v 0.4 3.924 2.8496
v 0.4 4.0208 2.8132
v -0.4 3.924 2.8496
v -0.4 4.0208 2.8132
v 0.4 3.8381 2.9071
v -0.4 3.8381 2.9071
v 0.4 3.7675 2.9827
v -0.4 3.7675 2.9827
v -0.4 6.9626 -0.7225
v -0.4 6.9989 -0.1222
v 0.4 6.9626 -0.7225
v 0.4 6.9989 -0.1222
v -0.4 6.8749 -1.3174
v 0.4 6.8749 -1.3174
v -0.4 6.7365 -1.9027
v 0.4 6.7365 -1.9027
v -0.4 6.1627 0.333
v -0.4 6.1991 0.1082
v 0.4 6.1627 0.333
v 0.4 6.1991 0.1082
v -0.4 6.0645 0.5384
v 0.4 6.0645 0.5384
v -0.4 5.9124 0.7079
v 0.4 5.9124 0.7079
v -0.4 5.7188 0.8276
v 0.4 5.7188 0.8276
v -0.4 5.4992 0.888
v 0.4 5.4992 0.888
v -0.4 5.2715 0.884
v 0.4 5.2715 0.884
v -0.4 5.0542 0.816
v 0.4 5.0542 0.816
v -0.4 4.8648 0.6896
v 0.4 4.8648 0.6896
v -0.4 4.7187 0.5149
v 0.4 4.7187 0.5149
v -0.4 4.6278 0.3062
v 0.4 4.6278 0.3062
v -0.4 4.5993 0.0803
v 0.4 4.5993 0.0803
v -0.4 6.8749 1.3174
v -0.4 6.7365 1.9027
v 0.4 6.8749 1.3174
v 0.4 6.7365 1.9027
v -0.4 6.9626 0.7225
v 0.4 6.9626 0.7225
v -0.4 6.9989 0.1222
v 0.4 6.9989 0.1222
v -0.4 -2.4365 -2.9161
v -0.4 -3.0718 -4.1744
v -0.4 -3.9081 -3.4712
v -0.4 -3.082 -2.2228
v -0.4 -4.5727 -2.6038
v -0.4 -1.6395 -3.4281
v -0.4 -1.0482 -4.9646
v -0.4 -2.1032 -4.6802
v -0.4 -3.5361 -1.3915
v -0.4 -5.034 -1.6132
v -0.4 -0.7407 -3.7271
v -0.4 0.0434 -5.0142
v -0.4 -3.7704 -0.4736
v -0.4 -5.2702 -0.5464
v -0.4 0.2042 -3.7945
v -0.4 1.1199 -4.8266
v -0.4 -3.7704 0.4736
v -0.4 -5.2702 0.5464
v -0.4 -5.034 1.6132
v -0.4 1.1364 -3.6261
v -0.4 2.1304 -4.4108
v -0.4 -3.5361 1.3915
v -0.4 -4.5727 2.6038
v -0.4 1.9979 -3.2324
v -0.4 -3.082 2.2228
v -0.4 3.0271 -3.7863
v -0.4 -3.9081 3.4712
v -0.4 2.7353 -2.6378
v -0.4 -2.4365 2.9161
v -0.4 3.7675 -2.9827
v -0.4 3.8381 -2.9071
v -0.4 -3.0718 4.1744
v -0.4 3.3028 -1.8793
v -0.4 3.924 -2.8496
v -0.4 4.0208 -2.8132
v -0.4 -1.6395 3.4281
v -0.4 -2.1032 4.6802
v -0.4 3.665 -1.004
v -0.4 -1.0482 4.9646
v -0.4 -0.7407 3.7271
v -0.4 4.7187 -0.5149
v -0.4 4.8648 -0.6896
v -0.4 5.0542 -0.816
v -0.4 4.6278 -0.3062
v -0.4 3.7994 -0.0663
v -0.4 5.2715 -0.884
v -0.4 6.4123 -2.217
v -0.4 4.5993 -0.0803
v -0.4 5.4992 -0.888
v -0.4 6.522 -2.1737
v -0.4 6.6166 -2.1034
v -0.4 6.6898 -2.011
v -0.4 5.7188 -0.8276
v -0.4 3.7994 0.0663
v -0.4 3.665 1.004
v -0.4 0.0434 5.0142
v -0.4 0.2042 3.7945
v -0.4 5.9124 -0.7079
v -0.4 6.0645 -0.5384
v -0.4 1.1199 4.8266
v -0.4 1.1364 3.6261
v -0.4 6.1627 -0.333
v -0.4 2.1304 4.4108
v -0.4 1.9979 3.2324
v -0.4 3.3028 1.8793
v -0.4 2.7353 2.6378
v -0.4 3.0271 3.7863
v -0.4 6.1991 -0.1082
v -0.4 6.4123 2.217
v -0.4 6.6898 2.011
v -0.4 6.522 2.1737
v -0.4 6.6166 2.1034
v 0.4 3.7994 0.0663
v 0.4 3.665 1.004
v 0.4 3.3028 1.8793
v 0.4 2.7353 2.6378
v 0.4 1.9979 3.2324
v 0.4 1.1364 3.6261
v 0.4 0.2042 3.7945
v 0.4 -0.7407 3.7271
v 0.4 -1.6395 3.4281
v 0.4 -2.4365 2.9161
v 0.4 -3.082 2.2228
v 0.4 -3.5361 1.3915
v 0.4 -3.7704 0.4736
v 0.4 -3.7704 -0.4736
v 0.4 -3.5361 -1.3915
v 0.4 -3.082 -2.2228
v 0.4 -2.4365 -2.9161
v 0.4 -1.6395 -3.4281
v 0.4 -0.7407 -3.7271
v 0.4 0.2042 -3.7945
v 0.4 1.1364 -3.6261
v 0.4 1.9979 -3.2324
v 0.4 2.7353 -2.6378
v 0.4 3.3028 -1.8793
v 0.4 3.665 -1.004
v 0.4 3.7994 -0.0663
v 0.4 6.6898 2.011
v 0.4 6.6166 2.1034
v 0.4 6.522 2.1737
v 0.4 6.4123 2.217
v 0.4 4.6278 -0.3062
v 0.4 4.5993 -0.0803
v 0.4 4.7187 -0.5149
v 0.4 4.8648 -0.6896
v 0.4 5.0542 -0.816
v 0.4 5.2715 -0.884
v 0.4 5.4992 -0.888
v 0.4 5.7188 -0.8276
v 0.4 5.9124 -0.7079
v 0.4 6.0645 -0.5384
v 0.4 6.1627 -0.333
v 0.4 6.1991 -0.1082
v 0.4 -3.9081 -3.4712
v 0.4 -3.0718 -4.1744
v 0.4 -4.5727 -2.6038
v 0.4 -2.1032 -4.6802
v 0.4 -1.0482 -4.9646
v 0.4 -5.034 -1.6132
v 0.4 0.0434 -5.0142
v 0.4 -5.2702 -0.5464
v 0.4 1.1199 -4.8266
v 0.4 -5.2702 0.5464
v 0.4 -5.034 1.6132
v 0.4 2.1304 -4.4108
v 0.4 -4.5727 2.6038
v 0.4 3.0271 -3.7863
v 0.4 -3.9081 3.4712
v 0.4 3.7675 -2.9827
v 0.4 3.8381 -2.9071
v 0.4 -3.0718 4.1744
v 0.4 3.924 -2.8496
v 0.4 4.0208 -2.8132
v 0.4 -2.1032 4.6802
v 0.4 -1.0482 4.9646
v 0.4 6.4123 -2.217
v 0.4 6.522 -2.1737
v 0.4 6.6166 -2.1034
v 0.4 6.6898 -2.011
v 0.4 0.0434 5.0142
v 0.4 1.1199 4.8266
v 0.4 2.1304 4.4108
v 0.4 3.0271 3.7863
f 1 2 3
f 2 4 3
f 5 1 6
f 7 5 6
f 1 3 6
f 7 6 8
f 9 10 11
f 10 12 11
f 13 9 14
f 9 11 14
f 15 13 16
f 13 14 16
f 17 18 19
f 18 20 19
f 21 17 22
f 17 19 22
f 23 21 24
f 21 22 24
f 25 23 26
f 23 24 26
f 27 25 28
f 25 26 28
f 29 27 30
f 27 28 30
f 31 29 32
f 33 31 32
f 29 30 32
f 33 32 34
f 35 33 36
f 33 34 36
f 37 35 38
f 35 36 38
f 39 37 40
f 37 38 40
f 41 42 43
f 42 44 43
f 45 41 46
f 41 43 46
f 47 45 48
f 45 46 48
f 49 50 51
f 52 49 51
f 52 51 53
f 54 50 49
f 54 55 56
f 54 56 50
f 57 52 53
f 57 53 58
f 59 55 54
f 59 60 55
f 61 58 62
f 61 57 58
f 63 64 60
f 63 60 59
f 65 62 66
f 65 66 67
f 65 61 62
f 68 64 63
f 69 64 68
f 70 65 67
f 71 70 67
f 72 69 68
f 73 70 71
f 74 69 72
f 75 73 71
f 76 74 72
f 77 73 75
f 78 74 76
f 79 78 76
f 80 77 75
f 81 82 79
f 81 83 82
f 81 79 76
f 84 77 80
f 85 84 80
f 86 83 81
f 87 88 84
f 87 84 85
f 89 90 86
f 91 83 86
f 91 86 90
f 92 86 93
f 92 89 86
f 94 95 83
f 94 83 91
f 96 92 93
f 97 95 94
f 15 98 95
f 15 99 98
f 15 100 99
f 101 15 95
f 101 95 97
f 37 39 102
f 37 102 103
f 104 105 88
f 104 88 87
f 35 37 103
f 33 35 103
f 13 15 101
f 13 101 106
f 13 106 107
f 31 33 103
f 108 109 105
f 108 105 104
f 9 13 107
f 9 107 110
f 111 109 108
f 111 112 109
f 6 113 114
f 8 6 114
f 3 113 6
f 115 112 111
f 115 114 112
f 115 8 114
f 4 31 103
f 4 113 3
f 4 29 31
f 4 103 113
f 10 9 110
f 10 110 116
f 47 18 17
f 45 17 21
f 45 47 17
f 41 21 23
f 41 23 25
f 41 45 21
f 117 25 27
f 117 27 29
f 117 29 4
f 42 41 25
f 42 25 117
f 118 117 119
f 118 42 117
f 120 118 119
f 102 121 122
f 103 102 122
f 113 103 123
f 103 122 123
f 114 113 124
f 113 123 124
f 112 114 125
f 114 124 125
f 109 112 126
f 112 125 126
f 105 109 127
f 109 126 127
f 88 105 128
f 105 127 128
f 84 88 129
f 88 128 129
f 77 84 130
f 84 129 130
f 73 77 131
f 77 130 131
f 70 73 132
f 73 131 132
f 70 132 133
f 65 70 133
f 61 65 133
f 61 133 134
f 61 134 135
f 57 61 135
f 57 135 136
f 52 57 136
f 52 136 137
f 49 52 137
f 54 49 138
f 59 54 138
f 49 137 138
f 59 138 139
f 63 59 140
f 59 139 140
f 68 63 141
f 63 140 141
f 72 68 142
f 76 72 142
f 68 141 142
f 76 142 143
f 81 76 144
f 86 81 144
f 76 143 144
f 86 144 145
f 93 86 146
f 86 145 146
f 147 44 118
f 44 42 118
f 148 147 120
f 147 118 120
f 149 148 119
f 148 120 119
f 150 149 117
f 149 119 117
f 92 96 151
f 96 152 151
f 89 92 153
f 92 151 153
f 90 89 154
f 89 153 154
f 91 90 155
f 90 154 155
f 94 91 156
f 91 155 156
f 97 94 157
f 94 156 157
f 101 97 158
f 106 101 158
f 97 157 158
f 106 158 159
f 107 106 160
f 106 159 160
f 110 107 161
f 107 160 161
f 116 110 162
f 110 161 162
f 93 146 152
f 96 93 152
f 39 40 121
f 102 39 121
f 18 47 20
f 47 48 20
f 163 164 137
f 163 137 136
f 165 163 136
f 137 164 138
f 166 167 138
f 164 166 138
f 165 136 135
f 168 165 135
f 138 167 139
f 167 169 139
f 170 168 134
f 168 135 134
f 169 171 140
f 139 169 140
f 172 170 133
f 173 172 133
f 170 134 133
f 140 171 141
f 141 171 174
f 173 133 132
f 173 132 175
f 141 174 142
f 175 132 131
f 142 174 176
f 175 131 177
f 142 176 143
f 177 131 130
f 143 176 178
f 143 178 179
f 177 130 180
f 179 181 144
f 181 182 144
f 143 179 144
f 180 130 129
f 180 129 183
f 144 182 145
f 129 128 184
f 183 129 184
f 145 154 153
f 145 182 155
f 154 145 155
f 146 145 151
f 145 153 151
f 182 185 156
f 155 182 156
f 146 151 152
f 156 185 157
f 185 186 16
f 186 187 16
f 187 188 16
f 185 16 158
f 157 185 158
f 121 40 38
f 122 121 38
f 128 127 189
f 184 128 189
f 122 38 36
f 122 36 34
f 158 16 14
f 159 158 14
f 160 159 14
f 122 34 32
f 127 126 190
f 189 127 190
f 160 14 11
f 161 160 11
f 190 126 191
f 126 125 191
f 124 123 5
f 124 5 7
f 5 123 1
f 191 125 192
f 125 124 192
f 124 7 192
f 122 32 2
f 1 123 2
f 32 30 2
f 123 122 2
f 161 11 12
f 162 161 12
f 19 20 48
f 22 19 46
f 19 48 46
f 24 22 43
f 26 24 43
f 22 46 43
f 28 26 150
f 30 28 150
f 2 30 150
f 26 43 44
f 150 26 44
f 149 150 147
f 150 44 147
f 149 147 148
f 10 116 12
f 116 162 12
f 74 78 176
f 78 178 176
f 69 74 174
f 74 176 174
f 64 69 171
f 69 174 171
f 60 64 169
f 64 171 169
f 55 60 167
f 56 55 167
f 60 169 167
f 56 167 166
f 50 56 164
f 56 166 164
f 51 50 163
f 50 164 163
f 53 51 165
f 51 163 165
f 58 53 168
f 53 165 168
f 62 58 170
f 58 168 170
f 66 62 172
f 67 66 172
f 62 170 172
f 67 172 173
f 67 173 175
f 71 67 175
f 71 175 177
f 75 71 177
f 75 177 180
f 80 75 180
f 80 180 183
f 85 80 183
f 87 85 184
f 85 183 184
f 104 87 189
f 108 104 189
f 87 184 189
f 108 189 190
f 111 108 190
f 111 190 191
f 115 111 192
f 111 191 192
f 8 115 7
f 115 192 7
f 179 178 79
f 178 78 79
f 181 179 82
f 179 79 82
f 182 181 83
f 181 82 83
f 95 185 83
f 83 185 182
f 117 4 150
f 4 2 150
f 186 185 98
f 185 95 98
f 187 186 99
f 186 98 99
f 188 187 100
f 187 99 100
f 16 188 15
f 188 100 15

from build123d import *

# Parameters (mm, degrees)
EXTRUDE1_DEPTH = 0.4
FILLET1_R      = 0.45


with BuildPart() as part:
    # Sketch1 → Extrude1 (new body, symmetric)
    with BuildSketch(Plane(origin=(0, 0, 0), x_dir=(0, 0, -1), z_dir=(1, 0, 0))):
        with BuildLine():
            Line((0.066319144, 3.799421242), (0.08028107, 4.599299398))
            ThreePointArc((0.08028107, 4.599299398), (0.894121151, 5.385215629), (0.10820492, 6.19905571))
            Line((0.10820492, 6.19905571), (0.122166845, 6.998933866))
            ThreePointArc((0.122166845, 6.998933866), (1.151239086, 6.904683089), (2.155222001, 6.659956316))
            Line((2.155222001, 6.659956316), (2.853372649, 3.859827007))
            ThreePointArc((2.853372649, 3.859827007), (0, -5.3), (-2.853372649, 3.859827007))
            Line((-2.853372649, 3.859827007), (-2.155222001, 6.659956316))
            ThreePointArc((-2.155222001, 6.659956316), (-1.151239086, 6.904683089), (-0.122166845, 6.998933866))
            Line((-0.122166845, 6.998933866), (-0.10820492, 6.19905571))
            ThreePointArc((-0.10820492, 6.19905571), (-0.894121151, 5.385215629), (-0.08028107, 4.599299398))
            Line((-0.08028107, 4.599299398), (-0.066319144, 3.799421242))
            ThreePointArc((-0.066319144, 3.799421242), (0, -3.8), (0.066319144, 3.799421242))
        make_face()
    extrude(amount=EXTRUDE1_DEPTH, both=True)

    # Fillet1
    fillet1_edges = [part.edges().sort_by_distance(p)[0] for p in [
        (0, 6.659956316, -2.155222001),
        (0, 3.859827007, -2.853372649),
        (0, 3.859827007, 2.853372649),
        (0, 6.659956316, 2.155222001),
    ]]
    fillet(fillet1_edges, radius=FILLET1_R)


solid = part.part
